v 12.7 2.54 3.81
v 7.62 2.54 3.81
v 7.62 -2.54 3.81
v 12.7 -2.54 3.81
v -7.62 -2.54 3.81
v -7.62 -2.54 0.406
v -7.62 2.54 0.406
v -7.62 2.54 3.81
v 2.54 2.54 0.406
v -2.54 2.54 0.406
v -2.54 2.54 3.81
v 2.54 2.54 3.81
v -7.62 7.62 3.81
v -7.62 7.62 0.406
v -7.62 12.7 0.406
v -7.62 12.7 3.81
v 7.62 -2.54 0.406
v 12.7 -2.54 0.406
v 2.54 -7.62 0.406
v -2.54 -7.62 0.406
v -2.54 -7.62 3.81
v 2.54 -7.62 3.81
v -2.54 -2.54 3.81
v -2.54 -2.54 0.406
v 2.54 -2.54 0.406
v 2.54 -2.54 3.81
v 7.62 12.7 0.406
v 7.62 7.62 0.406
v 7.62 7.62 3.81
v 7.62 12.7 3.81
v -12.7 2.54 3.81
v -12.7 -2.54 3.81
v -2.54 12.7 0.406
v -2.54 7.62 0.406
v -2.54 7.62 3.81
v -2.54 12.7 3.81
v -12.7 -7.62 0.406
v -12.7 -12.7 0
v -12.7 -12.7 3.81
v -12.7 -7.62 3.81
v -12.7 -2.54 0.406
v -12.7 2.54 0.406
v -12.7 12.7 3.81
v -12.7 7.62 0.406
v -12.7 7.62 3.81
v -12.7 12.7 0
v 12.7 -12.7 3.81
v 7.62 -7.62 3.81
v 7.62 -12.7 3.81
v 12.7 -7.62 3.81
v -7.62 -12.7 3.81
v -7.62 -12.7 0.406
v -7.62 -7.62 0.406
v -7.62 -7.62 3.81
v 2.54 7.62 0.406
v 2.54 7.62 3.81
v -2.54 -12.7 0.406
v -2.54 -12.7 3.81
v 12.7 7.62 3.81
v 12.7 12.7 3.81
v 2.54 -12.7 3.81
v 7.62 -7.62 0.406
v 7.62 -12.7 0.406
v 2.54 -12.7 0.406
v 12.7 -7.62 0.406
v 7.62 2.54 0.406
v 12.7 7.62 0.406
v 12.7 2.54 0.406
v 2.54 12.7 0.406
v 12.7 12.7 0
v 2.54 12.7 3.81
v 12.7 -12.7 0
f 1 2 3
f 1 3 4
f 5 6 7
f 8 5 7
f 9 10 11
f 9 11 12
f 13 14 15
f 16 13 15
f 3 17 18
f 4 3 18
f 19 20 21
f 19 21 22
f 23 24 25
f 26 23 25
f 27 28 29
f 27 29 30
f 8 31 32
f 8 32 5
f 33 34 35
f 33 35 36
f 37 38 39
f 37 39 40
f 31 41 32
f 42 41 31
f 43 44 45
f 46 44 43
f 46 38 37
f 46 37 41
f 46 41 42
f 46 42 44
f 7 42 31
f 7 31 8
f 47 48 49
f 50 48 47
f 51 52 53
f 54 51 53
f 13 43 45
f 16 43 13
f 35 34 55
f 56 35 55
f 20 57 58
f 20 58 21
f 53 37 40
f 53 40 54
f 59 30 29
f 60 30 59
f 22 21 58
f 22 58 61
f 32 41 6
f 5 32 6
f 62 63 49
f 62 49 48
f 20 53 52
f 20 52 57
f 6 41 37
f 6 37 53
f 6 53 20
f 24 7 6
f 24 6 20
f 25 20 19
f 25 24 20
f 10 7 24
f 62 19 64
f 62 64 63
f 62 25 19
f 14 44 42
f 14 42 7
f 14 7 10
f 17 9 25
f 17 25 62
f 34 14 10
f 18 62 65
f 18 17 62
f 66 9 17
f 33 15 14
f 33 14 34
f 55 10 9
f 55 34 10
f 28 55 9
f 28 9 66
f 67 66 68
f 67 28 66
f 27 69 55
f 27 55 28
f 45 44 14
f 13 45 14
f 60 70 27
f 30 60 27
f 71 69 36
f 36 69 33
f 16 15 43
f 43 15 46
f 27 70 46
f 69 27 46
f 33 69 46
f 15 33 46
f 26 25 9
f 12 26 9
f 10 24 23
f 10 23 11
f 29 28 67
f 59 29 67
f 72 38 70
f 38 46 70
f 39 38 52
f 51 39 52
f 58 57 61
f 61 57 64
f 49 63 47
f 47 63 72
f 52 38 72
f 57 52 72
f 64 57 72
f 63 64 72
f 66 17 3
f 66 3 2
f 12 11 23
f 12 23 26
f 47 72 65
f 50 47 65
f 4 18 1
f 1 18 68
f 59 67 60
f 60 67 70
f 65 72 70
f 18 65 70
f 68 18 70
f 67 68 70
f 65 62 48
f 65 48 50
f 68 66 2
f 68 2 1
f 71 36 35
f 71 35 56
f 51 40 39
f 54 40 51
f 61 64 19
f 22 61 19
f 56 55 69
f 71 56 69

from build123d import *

# Parameters (mm, degrees)
F0_W     = 5.08
F0_H     = 5.08
F1_DEPTH = 0.4064
F2_DEPTH = 3.81


with BuildPart() as f1:
    # F0 (on Top) → F1 (new body)
    with BuildSketch(Plane.XY):
        Polygon((-2.54, 12.7), (-7.62, 12.7), (-7.62, 7.62), (-12.7, 7.62), (-12.7, 2.54), (-7.62, 2.54), (-7.62, -2.54), (-12.7, -2.54), (-12.7, -7.62), (-7.62, -7.62), (-7.62, -12.7), (-2.54, -12.7), (-2.54, -7.62), (2.54, -7.62), (2.54, -12.7), (7.62, -12.7), (7.62, -7.62), (12.7, -7.62), (12.7, -2.54), (7.62, -2.54), (7.62, 2.54), (12.7, 2.54), (12.7, 7.62), (7.62, 7.62), (7.62, 12.7), (2.54, 12.7), (2.54, 7.62), (-2.54, 7.62), align=None)
        Rectangle(F0_W, F0_H, mode=Mode.SUBTRACT)
    extrude(amount=F1_DEPTH)

    # F0 (on Top) → F2 (join)
    with BuildSketch(Plane.XY):
        with Locations((-10.16, -10.16)):
            Rectangle(F0_W, F0_H)
        with Locations((-10.16, 0)):
            Rectangle(F0_W, F0_H)
        with Locations((-10.16, 10.16)):
            Rectangle(F0_W, F0_H)
        with Locations((0, 10.16)):
            Rectangle(F0_W, F0_H)
        Rectangle(F0_W, F0_H)
        with Locations((10.16, 0)):
            Rectangle(F0_W, F0_H)
        with Locations((10.16, 10.16)):
            Rectangle(F0_W, F0_H)
        with Locations((10.16, -10.16)):
            Rectangle(F0_W, F0_H)
        with Locations((0, -10.16)):
            Rectangle(F0_W, F0_H)
    extrude(amount=F2_DEPTH)


solid = f1.part
